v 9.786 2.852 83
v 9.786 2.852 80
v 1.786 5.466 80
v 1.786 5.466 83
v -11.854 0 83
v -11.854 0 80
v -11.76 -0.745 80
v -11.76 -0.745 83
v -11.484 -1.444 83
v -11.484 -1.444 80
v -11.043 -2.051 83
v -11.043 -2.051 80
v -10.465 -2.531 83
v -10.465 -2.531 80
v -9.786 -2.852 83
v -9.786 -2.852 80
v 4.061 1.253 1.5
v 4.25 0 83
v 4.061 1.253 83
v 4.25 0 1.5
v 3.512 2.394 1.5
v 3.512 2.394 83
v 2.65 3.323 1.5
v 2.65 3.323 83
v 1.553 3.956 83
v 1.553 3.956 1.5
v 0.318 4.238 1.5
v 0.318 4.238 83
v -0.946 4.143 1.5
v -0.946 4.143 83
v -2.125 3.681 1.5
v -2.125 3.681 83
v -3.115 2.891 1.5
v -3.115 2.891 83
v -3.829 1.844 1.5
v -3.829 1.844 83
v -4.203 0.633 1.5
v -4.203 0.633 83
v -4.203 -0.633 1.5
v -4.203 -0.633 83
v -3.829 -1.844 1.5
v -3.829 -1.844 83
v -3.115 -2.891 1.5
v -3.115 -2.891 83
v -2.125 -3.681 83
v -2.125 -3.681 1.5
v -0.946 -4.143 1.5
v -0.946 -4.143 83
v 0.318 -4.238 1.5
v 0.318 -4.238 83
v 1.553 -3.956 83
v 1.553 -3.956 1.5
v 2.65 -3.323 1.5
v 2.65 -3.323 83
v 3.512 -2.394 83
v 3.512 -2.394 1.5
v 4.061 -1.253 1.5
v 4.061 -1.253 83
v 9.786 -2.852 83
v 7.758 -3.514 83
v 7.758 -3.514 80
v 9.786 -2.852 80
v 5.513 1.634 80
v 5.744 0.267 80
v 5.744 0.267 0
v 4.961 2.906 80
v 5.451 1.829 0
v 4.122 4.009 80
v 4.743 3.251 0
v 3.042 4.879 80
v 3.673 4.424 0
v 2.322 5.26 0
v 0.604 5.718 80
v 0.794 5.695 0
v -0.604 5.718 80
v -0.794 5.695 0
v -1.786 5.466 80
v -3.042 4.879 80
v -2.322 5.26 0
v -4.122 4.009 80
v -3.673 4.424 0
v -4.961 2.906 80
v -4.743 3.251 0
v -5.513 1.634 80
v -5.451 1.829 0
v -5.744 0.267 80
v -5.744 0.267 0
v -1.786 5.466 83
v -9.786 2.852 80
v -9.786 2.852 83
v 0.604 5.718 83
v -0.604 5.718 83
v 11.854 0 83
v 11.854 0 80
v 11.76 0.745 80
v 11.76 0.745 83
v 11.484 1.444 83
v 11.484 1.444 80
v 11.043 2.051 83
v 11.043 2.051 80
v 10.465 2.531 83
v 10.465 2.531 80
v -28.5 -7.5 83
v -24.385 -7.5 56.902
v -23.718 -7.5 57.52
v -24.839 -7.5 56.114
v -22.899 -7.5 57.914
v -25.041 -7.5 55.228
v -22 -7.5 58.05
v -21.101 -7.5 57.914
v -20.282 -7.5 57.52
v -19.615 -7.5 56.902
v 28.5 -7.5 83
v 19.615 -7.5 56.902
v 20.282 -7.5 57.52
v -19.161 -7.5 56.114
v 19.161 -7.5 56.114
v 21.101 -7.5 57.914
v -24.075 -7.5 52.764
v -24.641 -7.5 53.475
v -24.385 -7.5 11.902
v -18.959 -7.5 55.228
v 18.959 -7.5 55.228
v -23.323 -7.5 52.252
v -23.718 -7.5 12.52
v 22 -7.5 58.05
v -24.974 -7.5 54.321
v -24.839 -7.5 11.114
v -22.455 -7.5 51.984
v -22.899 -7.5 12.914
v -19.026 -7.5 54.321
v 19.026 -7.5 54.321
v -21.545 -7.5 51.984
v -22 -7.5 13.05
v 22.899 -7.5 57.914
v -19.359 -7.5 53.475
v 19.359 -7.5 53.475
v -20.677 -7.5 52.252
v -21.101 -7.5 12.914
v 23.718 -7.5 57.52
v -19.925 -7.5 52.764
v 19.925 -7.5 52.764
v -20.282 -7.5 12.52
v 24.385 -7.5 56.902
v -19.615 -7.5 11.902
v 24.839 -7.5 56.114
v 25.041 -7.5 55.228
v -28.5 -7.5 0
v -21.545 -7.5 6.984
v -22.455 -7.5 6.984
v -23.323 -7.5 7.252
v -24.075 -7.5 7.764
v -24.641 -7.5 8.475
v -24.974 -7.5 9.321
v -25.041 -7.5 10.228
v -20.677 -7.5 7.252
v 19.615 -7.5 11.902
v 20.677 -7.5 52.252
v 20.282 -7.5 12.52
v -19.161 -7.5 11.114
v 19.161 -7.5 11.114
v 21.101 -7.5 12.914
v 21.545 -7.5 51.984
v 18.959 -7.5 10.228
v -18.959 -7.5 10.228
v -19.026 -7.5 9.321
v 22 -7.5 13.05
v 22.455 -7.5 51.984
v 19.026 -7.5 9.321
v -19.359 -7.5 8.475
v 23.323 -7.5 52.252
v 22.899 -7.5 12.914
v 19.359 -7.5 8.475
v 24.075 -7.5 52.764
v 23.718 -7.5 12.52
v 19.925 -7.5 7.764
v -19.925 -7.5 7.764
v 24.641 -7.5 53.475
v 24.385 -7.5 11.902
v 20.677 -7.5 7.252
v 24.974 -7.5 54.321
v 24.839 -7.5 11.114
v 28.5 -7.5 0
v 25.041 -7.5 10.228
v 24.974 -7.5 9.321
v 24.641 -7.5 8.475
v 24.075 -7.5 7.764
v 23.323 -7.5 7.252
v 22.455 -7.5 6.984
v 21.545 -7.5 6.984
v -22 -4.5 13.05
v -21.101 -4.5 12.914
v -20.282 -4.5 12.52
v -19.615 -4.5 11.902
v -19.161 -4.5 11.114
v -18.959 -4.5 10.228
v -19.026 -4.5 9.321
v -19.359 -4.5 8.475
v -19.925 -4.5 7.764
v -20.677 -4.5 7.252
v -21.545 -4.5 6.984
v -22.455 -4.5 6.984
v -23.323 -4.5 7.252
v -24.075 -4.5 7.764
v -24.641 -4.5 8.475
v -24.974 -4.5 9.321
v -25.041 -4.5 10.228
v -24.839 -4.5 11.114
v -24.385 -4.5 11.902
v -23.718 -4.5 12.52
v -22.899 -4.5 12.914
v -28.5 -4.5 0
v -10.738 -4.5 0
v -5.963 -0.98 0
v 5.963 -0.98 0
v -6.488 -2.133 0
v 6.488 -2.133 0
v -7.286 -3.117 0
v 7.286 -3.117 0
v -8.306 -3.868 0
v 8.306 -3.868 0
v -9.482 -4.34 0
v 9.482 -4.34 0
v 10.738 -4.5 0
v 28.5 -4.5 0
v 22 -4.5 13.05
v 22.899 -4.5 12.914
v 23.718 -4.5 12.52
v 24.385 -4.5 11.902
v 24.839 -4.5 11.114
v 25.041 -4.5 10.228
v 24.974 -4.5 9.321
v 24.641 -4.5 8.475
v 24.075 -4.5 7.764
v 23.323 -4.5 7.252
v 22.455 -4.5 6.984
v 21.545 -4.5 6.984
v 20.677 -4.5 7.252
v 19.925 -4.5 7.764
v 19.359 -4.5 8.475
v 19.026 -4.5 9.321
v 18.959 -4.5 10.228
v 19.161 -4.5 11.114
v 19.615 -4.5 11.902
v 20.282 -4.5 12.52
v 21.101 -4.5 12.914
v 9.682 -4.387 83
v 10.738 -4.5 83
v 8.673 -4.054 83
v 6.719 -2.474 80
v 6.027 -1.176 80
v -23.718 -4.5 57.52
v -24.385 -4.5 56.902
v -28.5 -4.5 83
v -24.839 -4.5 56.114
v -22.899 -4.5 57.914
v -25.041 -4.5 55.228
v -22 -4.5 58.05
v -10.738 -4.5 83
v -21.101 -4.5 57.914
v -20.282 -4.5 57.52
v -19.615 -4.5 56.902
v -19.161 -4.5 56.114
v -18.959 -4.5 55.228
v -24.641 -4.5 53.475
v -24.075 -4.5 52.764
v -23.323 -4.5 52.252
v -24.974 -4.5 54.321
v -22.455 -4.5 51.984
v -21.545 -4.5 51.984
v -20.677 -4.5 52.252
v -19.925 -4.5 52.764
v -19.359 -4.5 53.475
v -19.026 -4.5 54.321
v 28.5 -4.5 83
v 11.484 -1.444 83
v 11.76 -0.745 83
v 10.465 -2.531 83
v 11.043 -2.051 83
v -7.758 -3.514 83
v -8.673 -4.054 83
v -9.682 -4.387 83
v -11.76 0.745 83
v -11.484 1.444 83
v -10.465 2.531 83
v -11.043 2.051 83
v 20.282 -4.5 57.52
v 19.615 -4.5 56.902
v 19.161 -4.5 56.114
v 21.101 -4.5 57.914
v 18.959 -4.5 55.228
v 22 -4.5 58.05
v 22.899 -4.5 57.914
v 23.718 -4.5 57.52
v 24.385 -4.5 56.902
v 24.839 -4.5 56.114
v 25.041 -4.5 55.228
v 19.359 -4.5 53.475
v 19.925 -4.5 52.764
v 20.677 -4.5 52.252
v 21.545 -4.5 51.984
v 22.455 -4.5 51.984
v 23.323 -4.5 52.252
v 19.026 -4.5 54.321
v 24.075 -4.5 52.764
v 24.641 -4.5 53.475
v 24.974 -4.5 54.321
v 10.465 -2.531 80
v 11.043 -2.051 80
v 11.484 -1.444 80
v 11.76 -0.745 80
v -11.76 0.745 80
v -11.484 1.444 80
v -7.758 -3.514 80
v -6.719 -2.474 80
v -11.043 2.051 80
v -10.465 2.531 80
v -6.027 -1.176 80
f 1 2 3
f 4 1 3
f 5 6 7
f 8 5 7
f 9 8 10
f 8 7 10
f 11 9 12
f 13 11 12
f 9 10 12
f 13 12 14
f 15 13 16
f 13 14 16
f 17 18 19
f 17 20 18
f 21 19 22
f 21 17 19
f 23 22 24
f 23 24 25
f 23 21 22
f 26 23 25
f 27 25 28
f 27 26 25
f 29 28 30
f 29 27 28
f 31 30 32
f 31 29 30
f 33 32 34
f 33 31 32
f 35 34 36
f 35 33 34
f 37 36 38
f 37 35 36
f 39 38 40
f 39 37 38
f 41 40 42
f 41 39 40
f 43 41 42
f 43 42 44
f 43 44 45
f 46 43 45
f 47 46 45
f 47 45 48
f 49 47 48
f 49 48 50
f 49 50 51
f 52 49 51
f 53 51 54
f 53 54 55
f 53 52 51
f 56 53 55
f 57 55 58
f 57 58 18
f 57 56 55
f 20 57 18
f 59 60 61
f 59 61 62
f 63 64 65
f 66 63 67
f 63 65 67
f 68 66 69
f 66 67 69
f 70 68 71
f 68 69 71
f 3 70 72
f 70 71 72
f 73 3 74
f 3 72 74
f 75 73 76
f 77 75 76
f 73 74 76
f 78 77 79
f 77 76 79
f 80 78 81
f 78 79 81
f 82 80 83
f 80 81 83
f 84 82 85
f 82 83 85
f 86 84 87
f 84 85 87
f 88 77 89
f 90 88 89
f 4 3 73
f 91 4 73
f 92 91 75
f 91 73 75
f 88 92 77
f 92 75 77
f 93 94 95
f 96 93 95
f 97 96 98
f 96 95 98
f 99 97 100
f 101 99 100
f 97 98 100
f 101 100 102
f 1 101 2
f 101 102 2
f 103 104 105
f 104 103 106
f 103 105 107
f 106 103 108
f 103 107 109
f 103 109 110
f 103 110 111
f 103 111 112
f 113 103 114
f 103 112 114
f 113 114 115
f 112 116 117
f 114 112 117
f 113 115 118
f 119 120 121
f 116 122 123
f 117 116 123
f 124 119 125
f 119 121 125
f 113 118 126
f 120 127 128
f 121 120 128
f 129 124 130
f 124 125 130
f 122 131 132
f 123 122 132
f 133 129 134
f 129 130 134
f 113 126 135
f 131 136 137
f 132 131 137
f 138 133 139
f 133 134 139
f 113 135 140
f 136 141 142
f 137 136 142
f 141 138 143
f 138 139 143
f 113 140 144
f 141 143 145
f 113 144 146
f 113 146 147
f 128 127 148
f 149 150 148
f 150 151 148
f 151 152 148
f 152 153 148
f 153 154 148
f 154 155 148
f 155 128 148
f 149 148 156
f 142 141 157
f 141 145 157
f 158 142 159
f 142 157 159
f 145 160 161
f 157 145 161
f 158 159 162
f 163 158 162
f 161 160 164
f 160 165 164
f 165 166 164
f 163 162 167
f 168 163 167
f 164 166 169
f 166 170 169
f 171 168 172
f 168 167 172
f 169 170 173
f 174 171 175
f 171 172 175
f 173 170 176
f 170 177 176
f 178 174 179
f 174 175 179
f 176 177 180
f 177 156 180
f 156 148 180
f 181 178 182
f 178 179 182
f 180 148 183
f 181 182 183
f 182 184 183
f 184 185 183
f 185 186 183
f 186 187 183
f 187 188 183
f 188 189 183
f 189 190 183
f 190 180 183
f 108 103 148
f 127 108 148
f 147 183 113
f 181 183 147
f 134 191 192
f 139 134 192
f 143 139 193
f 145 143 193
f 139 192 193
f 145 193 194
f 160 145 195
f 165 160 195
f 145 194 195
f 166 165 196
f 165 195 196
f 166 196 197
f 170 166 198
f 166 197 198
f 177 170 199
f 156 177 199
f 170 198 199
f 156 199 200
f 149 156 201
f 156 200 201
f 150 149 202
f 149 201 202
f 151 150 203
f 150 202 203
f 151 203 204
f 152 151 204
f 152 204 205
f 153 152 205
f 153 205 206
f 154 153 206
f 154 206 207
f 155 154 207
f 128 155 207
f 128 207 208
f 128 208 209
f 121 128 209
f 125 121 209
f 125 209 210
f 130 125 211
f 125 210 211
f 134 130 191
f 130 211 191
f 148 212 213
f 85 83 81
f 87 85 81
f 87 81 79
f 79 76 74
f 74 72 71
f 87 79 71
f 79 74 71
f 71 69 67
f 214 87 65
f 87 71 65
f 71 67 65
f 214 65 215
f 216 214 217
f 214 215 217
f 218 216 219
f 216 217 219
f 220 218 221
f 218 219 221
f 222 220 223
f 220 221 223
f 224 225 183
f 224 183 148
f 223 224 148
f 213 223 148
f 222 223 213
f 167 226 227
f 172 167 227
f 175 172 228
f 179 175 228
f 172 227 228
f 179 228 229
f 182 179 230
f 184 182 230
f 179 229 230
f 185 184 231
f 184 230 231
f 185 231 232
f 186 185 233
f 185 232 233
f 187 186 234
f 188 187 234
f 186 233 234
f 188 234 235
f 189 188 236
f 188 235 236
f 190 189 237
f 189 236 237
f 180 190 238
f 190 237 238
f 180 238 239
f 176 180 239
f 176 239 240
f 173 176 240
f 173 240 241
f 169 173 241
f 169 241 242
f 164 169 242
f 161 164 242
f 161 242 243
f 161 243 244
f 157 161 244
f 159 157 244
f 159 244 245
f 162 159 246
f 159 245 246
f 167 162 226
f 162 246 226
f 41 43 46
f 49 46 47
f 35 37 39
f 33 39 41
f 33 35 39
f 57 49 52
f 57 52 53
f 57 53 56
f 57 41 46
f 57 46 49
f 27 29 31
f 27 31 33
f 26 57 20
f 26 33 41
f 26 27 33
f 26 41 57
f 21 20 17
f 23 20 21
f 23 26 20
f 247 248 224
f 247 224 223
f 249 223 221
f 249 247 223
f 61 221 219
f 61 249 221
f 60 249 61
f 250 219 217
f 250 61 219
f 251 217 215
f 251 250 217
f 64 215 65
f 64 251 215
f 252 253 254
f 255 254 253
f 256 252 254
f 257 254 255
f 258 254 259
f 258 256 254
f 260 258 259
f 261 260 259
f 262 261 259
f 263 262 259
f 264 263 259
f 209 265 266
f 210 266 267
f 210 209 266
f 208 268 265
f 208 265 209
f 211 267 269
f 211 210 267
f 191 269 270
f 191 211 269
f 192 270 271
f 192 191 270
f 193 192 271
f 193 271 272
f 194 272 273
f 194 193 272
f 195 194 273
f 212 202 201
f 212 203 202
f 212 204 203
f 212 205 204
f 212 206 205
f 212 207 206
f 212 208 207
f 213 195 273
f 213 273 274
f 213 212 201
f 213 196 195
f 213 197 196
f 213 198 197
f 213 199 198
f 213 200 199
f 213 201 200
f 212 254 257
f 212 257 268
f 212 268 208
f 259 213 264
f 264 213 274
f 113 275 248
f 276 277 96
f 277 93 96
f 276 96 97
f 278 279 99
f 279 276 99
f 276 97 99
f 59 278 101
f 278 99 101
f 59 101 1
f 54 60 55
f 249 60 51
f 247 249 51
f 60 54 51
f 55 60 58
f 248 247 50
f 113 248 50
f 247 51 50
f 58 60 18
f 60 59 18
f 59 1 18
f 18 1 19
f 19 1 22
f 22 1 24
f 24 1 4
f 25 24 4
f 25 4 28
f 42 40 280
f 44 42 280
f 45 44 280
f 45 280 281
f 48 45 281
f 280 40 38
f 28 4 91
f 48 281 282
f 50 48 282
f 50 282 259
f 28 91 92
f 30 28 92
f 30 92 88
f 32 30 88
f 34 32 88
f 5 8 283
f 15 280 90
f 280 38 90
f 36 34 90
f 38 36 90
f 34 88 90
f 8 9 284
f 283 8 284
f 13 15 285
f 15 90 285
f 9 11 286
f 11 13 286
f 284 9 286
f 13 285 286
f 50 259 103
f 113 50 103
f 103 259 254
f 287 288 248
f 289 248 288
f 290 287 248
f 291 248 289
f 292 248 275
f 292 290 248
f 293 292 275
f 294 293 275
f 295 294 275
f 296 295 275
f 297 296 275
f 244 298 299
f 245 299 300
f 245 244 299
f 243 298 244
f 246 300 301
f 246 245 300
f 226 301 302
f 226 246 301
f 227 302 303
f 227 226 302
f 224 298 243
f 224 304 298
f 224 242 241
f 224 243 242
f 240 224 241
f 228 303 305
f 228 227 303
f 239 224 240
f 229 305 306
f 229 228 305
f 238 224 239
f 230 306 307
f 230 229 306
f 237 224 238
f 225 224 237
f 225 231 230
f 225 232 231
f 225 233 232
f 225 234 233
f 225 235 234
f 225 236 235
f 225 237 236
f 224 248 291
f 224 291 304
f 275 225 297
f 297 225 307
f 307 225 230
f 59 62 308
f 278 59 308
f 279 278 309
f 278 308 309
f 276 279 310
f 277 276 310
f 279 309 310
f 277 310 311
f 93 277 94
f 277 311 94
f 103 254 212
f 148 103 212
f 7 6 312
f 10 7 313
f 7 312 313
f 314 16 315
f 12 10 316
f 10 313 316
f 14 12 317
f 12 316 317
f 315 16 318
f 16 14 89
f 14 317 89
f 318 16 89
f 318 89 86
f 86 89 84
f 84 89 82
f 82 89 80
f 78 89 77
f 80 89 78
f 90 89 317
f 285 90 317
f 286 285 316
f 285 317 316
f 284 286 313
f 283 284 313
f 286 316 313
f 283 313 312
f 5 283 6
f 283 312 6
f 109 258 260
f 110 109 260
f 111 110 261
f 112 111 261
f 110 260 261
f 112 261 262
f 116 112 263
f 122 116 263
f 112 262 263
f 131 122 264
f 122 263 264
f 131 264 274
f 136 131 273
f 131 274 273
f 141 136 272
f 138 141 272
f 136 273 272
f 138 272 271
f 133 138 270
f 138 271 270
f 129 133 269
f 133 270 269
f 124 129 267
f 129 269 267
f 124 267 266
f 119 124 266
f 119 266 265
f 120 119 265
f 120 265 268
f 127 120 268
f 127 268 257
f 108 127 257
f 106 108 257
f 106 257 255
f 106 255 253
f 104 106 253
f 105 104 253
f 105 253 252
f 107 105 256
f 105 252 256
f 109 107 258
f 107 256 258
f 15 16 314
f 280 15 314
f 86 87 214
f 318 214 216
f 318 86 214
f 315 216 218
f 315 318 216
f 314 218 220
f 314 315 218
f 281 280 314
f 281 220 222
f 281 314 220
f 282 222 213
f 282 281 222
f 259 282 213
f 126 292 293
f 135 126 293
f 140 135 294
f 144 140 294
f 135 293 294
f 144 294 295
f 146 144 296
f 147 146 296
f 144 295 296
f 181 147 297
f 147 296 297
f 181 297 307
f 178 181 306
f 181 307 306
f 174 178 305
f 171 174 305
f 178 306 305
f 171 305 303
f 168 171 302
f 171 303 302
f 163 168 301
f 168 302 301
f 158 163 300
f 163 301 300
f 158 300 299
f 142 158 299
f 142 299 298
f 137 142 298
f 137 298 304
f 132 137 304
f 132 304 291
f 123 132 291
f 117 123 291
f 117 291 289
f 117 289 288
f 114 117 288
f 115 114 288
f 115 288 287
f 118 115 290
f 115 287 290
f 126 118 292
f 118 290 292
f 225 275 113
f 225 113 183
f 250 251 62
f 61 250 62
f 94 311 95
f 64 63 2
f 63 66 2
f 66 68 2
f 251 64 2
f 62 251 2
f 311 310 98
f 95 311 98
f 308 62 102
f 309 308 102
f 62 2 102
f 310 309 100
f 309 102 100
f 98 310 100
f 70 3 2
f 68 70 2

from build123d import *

# Parameters (mm, degrees)
ESQUISSE1_R        = 4.25
BOSS_EXTRU_1_DEPTH = 1.5
ESQUISSE1_2_R      = 5.75
ESQUISSE1_2_R_2    = 4.25
EXTRU_MINCE1_DEPTH = 80
ESQUISSE2_R        = 5.75
ESQUISSE2_R_2      = 4.25
BOSS_EXTRU_2_DEPTH = 3
ESQUISSE4_W        = 57
ESQUISSE4_H        = 83
ESQUISSE4_R        = 3.05
BOSS_EXTRU_3_DEPTH = 3
CONG_1_R           = 5


with BuildPart() as part:
    # Esquisse1 → Boss.-Extru.1 (new body)
    with BuildSketch(Plane.XY):
        Circle(ESQUISSE1_R)
    extrude(amount=BOSS_EXTRU_1_DEPTH)

    # Esquisse1<2> → Extru.-Mince1 (add)
    with BuildSketch(Plane.XY):
        Circle(ESQUISSE1_2_R)
        Circle(ESQUISSE1_2_R_2, mode=Mode.SUBTRACT)
    extrude(amount=EXTRU_MINCE1_DEPTH)

    # Esquisse2 → Boss.-Extru.2 (add)
    # profile 1 of 3: a face of its own
    with BuildSketch(Plane.XY.offset(80)):
        with BuildLine():
            Line((9.78589137, 2.851632123), (1.78589137, 5.465628236))
            ThreePointArc((1.78589137, 5.465628236), (4.654641521, 3.375916514), (5.75, 0))
            ThreePointArc((5.75, 0), (4.654641521, -3.375916514), (1.78589137, -5.465628236))
            Line((1.78589137, -5.465628236), (9.78589137, -2.851632123))
            ThreePointArc((9.78589137, -2.851632123), (11.282630579, -1.761347746), (11.85412196, 0))
            ThreePointArc((11.85412196, 0), (11.282630579, 1.761347746), (9.78589137, 2.851632123))
        make_face()
    # profile 2 of 3: a face of its own
    with BuildSketch(Plane.XY.offset(80)):
        with BuildLine():
            ThreePointArc((-1.78589137, -5.465628236), (-5.75, 0), (-1.78589137, 5.465628236))
            Line((-1.78589137, 5.465628236), (-9.78589137, 2.851632123))
            ThreePointArc((-9.78589137, 2.851632123), (-11.282630579, 1.761347746), (-11.85412196, 0))
            ThreePointArc((-11.85412196, 0), (-11.282630579, -1.761347746), (-9.78589137, -2.851632123))
            Line((-9.78589137, -2.851632123), (-1.78589137, -5.465628236))
        make_face()
    # profile 3 of 3: a face of its own
    with BuildSketch(Plane.XY.offset(80)):
        with Locations(Location((0, 0, 0), (0, 0, 108.094778376))):
            Circle(ESQUISSE2_R)
        Circle(ESQUISSE2_R_2, mode=Mode.SUBTRACT)
    extrude(amount=BOSS_EXTRU_2_DEPTH)

    # Esquisse4 → Boss.-Extru.3 (add)
    with BuildSketch(Plane(origin=(0, -4.5, 0), x_dir=(1, 0, 0), z_dir=(0, 1, 0))):
        with Locations((0, -41.5)):
            Rectangle(ESQUISSE4_W, ESQUISSE4_H)
        with Locations(Location((22, -55, 0), (0, 0, 270))):
            Circle(ESQUISSE4_R, mode=Mode.SUBTRACT)
        with Locations(Location((-22, -55, 0), (0, 0, 270))):
            Circle(ESQUISSE4_R, mode=Mode.SUBTRACT)
        with Locations(Location((-22, -10, 0), (0, 0, 270))):
            Circle(ESQUISSE4_R, mode=Mode.SUBTRACT)
        with Locations(Location((22, -10, 0), (0, 0, 270))):
            Circle(ESQUISSE4_R, mode=Mode.SUBTRACT)
    extrude(amount=-BOSS_EXTRU_3_DEPTH)

    # Congé1
    # the kernel refuses this fillet: 5 mm, written as the material it adds along each edge
    with BuildSketch(Plane(origin=(3.579455266, -4.5, 97.897276329), x_dir=(0.4133759504867887, 0.9105604447586902, 0), z_dir=(0, 0, -1))) as cong_1_piece_1_section:
        with BuildLine():
            CenterArc((7.512123669, 4.451741005), CONG_1_R, 155.582916087, 87.334118235)
            Line((2.959321445, 6.518620758), (0, 0))
            ThreePointArc((0, 0), (2.617861279, 0.630497844), (5.235722557, 0))
        make_face()
    cong_1_piece_1 = extrude(amount=97.897276329, mode=Mode.PRIVATE)
    cong_1_piece_1 = split(cong_1_piece_1, bisect_by=Plane(origin=(6.241297516, -3.427571976, 83), z_dir=(0, 0, -1)), keep=Keep.TOP, mode=Mode.PRIVATE)
    add(cong_1_piece_1)
    with BuildSketch(Plane(origin=(-3.579455266, -4.5, 97.897276329), x_dir=(-0.41337595048678866, 0.9105604447586904, 0), z_dir=(0, 0, -1))) as cong_1_piece_2_section:
        with BuildLine():
            CenterArc((7.512123669, -4.451741005), CONG_1_R, 117.082965678, 87.334118235)
            Line((2.959321445, -6.518620758), (0, 0))
            ThreePointArc((0, 0), (2.617861279, -0.630497844), (5.235722557, 0))
        make_face()
    cong_1_piece_2 = extrude(amount=97.897276329, mode=Mode.PRIVATE)
    cong_1_piece_2 = split(cong_1_piece_2, bisect_by=Plane(origin=(-6.241297516, -3.427571976, 83), z_dir=(0, 0, -1)), keep=Keep.TOP, mode=Mode.PRIVATE)
    add(cong_1_piece_2)


solid = part.part
